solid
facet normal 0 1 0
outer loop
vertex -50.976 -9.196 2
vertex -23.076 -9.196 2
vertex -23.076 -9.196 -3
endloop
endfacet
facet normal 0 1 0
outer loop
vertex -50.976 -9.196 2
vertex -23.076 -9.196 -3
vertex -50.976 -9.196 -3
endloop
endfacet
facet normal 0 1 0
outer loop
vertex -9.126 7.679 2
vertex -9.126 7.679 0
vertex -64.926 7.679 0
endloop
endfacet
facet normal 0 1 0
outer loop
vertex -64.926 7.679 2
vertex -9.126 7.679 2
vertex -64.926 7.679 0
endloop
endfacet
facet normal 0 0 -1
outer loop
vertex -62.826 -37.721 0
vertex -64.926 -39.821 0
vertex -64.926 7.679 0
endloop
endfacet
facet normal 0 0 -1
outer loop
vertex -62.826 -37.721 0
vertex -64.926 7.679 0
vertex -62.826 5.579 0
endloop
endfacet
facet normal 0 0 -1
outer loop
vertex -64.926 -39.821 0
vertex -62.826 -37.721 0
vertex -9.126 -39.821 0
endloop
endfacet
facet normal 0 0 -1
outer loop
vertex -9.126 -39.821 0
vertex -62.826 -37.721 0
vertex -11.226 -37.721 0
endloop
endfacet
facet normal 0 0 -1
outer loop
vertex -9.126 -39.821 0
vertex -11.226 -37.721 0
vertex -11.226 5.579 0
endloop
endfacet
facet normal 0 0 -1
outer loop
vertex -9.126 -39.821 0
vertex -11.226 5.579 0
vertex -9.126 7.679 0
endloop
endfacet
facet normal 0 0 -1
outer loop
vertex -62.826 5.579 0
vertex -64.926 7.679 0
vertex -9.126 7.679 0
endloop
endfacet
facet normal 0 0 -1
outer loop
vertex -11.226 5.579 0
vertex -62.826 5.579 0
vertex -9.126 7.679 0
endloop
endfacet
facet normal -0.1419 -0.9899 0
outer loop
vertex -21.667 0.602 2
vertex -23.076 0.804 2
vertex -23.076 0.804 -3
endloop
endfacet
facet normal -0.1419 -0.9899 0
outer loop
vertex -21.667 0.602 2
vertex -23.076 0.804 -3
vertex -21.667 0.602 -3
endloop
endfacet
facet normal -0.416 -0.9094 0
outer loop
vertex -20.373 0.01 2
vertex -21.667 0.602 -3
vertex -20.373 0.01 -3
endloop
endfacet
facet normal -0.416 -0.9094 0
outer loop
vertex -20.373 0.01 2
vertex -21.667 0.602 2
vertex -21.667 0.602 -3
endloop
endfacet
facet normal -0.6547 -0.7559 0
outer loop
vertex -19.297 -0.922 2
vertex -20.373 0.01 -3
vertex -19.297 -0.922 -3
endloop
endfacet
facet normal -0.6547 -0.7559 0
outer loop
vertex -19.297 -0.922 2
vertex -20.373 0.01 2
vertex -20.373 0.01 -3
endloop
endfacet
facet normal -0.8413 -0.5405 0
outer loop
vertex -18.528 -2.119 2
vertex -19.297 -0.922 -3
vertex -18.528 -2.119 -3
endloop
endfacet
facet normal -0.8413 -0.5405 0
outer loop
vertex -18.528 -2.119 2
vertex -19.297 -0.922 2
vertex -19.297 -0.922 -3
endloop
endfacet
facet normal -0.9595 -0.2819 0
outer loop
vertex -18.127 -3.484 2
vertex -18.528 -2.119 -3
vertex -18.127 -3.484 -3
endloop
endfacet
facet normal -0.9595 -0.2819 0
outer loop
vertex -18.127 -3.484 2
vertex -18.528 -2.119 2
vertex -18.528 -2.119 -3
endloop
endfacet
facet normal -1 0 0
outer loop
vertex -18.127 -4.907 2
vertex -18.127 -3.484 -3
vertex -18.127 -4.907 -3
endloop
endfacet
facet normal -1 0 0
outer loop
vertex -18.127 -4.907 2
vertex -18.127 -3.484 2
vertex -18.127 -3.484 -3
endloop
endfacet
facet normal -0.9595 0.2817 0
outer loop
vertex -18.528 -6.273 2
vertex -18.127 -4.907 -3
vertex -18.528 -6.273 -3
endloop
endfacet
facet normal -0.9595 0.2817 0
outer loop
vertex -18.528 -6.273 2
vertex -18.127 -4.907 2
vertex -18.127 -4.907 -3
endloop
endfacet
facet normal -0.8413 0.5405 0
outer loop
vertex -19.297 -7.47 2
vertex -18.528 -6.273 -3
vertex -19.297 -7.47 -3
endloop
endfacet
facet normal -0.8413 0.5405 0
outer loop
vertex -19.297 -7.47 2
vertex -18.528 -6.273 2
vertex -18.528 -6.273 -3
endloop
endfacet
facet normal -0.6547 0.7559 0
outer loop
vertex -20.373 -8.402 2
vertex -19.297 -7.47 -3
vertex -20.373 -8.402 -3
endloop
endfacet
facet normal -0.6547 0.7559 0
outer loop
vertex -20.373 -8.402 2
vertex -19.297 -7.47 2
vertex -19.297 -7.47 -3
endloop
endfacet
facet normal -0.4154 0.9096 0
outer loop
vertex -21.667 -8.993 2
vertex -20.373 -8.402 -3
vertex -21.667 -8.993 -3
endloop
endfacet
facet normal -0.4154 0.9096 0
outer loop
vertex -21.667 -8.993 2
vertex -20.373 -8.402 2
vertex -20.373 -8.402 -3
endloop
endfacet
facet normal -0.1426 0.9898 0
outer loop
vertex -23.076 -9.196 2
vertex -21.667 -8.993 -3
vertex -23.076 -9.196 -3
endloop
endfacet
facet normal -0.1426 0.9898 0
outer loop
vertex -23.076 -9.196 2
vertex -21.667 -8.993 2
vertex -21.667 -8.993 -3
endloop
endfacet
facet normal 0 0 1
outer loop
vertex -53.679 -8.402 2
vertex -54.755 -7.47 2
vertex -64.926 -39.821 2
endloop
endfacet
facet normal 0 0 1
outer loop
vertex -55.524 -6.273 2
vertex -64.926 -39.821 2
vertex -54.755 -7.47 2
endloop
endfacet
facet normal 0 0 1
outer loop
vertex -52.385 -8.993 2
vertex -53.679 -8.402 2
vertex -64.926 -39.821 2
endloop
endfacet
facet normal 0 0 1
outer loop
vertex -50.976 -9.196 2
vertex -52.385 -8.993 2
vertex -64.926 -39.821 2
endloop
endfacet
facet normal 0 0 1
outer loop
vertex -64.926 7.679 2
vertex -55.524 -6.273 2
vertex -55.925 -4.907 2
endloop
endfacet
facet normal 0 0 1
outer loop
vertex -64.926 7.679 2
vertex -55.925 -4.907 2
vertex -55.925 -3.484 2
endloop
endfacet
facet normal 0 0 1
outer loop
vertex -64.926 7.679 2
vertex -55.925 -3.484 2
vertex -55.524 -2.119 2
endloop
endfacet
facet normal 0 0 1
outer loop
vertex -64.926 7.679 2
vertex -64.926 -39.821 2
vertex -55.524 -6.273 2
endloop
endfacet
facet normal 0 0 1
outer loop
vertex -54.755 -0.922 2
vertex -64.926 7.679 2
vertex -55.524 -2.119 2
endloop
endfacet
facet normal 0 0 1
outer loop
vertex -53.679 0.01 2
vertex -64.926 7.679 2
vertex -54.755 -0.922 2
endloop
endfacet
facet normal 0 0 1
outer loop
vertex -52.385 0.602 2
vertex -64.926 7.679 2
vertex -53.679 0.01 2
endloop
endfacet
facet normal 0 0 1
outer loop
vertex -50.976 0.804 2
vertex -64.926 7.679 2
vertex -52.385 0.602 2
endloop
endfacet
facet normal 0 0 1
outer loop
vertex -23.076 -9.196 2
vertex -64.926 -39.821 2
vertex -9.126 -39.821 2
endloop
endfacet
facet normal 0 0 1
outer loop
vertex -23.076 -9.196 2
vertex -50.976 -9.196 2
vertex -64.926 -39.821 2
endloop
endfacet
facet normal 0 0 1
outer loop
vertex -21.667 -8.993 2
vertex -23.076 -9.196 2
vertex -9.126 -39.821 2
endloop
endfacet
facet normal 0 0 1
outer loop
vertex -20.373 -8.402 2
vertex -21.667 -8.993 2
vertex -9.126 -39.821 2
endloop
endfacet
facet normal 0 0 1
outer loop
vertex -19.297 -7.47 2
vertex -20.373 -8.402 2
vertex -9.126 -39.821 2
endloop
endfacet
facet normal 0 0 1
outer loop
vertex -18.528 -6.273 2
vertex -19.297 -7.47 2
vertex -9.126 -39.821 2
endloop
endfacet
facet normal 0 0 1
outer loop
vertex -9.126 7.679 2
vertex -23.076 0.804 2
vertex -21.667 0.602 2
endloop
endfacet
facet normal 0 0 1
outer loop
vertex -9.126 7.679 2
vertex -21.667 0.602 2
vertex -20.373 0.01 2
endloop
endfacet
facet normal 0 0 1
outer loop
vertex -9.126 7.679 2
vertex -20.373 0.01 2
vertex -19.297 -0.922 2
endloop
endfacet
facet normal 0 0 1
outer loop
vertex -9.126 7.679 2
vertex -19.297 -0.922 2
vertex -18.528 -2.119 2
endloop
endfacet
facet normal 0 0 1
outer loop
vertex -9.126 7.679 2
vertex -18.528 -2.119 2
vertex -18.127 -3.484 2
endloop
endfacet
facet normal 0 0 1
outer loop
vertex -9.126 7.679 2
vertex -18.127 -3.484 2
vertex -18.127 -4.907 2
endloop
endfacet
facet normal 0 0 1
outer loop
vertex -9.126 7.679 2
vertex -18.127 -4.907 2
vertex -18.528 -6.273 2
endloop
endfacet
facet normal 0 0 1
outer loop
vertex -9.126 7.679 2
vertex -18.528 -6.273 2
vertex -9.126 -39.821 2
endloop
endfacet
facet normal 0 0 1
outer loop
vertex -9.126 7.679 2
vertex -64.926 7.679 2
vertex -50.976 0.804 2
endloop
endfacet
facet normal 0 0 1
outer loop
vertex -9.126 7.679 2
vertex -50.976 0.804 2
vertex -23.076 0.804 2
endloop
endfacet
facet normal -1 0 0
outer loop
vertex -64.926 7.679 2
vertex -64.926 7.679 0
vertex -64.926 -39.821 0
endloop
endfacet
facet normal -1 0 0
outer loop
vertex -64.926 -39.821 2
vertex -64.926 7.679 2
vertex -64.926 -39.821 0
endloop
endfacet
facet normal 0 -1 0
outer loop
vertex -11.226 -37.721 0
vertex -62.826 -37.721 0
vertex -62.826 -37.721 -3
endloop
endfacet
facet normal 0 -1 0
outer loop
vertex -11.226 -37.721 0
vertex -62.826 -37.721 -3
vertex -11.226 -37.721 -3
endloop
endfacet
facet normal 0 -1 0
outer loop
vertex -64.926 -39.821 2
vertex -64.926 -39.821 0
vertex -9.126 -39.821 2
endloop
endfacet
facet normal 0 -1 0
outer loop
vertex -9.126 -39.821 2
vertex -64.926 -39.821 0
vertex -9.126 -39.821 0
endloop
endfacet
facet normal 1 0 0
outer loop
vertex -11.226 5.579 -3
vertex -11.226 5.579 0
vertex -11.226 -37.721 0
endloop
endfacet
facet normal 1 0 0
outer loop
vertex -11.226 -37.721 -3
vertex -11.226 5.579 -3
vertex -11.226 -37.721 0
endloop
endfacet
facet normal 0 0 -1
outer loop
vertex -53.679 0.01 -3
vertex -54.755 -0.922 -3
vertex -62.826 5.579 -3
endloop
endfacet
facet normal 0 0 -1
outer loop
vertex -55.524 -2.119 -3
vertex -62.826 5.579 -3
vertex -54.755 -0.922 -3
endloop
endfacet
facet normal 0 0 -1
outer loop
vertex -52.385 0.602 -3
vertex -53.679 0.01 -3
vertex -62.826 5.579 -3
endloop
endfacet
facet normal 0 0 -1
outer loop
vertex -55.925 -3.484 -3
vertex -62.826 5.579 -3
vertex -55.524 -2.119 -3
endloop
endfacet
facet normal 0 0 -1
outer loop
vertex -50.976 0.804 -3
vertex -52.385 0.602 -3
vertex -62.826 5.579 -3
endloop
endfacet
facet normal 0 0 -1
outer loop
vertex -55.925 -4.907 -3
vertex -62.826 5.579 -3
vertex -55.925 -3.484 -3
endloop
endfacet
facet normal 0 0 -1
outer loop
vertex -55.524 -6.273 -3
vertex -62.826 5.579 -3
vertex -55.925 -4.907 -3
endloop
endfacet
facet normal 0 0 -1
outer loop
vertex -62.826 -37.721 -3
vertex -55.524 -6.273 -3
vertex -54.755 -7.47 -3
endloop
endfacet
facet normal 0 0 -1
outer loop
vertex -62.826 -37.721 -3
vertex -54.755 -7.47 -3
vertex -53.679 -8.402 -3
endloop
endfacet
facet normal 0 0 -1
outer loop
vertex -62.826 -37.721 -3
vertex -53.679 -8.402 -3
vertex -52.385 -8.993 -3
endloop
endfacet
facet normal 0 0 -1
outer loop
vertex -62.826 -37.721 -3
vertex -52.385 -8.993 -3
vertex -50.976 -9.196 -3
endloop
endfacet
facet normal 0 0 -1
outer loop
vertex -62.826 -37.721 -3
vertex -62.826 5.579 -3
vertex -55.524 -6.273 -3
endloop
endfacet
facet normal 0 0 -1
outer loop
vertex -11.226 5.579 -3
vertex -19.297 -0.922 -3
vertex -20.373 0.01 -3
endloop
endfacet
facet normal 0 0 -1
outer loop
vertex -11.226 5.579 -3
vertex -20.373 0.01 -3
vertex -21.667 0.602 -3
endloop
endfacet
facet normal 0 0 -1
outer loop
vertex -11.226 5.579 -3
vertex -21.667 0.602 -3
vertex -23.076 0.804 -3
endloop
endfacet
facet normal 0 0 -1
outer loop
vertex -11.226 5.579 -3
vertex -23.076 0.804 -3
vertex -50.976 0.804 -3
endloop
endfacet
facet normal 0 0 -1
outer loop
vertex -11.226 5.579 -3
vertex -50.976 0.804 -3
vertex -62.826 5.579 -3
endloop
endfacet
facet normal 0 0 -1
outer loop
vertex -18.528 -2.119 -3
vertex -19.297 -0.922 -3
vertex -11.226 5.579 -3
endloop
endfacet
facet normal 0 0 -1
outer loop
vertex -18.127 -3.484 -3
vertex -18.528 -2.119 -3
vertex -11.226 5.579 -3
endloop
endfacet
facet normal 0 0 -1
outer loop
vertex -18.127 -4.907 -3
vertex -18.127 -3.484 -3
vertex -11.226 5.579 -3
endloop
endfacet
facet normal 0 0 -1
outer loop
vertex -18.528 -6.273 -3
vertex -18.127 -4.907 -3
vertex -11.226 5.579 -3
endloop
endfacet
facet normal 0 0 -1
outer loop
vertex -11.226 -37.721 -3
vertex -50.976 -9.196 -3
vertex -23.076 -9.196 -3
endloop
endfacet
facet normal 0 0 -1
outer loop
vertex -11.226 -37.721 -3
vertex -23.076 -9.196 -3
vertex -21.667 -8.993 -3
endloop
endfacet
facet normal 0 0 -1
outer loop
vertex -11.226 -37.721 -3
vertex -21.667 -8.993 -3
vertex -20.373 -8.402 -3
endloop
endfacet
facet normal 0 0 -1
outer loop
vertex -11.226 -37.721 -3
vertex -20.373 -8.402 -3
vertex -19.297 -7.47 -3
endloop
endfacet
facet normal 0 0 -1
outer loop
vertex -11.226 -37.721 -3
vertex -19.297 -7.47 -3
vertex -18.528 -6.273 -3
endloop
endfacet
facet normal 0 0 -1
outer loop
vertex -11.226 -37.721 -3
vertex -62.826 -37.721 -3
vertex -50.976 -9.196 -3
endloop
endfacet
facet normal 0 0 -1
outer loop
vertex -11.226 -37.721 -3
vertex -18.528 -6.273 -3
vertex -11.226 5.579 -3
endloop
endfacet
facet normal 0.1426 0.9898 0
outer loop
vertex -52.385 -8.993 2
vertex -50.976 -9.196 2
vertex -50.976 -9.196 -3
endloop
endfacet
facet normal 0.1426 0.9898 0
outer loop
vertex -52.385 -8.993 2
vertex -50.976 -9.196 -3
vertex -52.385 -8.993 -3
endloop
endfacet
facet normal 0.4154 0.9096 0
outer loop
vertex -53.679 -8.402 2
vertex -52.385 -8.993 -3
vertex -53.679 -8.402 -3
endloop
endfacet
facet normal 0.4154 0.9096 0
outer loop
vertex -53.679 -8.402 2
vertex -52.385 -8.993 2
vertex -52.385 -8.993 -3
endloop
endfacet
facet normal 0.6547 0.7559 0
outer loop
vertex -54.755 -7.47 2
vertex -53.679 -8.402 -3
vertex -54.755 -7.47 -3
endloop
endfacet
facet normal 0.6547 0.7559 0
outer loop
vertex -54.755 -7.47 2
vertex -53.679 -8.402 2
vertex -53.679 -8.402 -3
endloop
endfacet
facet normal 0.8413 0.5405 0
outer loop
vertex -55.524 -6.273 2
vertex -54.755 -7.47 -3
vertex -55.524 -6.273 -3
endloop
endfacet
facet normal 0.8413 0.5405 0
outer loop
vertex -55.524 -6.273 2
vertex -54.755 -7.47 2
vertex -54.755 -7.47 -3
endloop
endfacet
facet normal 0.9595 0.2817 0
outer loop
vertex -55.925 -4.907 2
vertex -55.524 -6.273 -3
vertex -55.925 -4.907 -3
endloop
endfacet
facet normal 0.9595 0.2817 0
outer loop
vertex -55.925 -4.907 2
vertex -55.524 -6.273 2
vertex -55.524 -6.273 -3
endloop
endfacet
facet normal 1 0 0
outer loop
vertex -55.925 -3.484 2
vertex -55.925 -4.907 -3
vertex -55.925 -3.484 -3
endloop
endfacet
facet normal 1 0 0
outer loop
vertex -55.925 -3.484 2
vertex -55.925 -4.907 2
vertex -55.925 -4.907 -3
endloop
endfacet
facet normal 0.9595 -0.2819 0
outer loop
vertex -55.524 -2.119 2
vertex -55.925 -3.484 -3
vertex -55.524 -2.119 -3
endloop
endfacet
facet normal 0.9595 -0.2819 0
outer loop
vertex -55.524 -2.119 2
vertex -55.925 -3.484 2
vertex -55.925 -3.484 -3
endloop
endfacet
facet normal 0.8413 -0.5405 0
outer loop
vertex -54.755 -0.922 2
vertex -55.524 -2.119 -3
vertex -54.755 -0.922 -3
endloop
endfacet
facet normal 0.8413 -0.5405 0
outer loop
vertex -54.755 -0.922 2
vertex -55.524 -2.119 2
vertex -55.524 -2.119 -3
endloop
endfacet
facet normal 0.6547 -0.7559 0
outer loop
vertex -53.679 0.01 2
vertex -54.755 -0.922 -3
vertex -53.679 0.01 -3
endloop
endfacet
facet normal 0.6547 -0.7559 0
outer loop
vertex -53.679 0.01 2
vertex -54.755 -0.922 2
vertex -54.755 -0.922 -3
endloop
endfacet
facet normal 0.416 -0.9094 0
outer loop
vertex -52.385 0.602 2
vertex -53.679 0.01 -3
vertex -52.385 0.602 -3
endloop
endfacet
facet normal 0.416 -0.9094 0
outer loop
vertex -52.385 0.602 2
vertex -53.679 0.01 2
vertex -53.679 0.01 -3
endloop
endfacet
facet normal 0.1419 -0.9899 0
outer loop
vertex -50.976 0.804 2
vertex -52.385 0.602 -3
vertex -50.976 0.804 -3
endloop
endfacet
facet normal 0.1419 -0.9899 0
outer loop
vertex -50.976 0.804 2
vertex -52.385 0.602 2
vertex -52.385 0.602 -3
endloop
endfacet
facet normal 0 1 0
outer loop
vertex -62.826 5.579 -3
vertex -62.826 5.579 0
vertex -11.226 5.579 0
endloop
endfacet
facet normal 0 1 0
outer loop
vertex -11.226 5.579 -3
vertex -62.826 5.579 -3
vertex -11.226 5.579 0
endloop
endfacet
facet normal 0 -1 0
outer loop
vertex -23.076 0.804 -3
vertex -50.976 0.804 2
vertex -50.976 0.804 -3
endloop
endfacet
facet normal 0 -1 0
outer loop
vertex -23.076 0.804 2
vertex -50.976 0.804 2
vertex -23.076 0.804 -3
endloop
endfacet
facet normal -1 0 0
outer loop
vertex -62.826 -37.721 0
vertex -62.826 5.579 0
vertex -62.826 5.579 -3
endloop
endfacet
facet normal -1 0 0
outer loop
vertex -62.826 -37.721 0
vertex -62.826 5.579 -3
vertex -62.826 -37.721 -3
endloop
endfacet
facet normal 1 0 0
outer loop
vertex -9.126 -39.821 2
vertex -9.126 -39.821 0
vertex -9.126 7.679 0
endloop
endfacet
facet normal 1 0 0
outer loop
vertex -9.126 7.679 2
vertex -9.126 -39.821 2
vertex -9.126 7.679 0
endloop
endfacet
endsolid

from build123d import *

# Parameters (mm, degrees)
F1_DEPTH = 2
F2_W     = 51.6000000954
F2_H     = 43.3000000954
F3_DEPTH = 3
F4_DEPTH = 17.9


with BuildPart() as f1:
    # F0 (on Top) → F1 (new body)
    with BuildSketch(Plane.XY):
        Polygon((-9.1260878563, 7.6790904999), (-64.9260878563, 7.6790904999), (-64.9260878563, -39.8209095001), (-9.1260878563, -39.8209095001), (-9.1260878563, -16.0709095001), align=None)
        with BuildLine():
            ThreePointArc((-50.9760878563, -9.1959095001), (-55.9760878563, -4.1959095001), (-50.9760878563, 0.8040904999))
            Line((-50.9760878563, 0.8040904999), (-23.0760878563, 0.8040904999))
            ThreePointArc((-23.0760878563, 0.8040904999), (-18.0760878563, -4.1959095001), (-23.0760878563, -9.1959095001))
            Line((-23.0760878563, -9.1959095001), (-50.9760878563, -9.1959095001))
        make_face(mode=Mode.SUBTRACT)
    extrude(amount=F1_DEPTH)

    # F2 (on face) → F3 (join)
    with BuildSketch(Plane(origin=(0, 0, 0), x_dir=(1, 0, 0), z_dir=(0, 0, -1))):
        with Locations((-37.0260878563, 16.0709095001)):
            Rectangle(F2_W, F2_H)
    extrude(amount=F3_DEPTH)

    # F4 (cut): a face of the model
    f4_faces = [f1.faces().sort_by_distance(p)[0] for p in [
        (-37.0260878563, -4.1959095001, 0),
    ]]
    extrude(f4_faces, amount=-F4_DEPTH, mode=Mode.SUBTRACT)


solid = f1.part
